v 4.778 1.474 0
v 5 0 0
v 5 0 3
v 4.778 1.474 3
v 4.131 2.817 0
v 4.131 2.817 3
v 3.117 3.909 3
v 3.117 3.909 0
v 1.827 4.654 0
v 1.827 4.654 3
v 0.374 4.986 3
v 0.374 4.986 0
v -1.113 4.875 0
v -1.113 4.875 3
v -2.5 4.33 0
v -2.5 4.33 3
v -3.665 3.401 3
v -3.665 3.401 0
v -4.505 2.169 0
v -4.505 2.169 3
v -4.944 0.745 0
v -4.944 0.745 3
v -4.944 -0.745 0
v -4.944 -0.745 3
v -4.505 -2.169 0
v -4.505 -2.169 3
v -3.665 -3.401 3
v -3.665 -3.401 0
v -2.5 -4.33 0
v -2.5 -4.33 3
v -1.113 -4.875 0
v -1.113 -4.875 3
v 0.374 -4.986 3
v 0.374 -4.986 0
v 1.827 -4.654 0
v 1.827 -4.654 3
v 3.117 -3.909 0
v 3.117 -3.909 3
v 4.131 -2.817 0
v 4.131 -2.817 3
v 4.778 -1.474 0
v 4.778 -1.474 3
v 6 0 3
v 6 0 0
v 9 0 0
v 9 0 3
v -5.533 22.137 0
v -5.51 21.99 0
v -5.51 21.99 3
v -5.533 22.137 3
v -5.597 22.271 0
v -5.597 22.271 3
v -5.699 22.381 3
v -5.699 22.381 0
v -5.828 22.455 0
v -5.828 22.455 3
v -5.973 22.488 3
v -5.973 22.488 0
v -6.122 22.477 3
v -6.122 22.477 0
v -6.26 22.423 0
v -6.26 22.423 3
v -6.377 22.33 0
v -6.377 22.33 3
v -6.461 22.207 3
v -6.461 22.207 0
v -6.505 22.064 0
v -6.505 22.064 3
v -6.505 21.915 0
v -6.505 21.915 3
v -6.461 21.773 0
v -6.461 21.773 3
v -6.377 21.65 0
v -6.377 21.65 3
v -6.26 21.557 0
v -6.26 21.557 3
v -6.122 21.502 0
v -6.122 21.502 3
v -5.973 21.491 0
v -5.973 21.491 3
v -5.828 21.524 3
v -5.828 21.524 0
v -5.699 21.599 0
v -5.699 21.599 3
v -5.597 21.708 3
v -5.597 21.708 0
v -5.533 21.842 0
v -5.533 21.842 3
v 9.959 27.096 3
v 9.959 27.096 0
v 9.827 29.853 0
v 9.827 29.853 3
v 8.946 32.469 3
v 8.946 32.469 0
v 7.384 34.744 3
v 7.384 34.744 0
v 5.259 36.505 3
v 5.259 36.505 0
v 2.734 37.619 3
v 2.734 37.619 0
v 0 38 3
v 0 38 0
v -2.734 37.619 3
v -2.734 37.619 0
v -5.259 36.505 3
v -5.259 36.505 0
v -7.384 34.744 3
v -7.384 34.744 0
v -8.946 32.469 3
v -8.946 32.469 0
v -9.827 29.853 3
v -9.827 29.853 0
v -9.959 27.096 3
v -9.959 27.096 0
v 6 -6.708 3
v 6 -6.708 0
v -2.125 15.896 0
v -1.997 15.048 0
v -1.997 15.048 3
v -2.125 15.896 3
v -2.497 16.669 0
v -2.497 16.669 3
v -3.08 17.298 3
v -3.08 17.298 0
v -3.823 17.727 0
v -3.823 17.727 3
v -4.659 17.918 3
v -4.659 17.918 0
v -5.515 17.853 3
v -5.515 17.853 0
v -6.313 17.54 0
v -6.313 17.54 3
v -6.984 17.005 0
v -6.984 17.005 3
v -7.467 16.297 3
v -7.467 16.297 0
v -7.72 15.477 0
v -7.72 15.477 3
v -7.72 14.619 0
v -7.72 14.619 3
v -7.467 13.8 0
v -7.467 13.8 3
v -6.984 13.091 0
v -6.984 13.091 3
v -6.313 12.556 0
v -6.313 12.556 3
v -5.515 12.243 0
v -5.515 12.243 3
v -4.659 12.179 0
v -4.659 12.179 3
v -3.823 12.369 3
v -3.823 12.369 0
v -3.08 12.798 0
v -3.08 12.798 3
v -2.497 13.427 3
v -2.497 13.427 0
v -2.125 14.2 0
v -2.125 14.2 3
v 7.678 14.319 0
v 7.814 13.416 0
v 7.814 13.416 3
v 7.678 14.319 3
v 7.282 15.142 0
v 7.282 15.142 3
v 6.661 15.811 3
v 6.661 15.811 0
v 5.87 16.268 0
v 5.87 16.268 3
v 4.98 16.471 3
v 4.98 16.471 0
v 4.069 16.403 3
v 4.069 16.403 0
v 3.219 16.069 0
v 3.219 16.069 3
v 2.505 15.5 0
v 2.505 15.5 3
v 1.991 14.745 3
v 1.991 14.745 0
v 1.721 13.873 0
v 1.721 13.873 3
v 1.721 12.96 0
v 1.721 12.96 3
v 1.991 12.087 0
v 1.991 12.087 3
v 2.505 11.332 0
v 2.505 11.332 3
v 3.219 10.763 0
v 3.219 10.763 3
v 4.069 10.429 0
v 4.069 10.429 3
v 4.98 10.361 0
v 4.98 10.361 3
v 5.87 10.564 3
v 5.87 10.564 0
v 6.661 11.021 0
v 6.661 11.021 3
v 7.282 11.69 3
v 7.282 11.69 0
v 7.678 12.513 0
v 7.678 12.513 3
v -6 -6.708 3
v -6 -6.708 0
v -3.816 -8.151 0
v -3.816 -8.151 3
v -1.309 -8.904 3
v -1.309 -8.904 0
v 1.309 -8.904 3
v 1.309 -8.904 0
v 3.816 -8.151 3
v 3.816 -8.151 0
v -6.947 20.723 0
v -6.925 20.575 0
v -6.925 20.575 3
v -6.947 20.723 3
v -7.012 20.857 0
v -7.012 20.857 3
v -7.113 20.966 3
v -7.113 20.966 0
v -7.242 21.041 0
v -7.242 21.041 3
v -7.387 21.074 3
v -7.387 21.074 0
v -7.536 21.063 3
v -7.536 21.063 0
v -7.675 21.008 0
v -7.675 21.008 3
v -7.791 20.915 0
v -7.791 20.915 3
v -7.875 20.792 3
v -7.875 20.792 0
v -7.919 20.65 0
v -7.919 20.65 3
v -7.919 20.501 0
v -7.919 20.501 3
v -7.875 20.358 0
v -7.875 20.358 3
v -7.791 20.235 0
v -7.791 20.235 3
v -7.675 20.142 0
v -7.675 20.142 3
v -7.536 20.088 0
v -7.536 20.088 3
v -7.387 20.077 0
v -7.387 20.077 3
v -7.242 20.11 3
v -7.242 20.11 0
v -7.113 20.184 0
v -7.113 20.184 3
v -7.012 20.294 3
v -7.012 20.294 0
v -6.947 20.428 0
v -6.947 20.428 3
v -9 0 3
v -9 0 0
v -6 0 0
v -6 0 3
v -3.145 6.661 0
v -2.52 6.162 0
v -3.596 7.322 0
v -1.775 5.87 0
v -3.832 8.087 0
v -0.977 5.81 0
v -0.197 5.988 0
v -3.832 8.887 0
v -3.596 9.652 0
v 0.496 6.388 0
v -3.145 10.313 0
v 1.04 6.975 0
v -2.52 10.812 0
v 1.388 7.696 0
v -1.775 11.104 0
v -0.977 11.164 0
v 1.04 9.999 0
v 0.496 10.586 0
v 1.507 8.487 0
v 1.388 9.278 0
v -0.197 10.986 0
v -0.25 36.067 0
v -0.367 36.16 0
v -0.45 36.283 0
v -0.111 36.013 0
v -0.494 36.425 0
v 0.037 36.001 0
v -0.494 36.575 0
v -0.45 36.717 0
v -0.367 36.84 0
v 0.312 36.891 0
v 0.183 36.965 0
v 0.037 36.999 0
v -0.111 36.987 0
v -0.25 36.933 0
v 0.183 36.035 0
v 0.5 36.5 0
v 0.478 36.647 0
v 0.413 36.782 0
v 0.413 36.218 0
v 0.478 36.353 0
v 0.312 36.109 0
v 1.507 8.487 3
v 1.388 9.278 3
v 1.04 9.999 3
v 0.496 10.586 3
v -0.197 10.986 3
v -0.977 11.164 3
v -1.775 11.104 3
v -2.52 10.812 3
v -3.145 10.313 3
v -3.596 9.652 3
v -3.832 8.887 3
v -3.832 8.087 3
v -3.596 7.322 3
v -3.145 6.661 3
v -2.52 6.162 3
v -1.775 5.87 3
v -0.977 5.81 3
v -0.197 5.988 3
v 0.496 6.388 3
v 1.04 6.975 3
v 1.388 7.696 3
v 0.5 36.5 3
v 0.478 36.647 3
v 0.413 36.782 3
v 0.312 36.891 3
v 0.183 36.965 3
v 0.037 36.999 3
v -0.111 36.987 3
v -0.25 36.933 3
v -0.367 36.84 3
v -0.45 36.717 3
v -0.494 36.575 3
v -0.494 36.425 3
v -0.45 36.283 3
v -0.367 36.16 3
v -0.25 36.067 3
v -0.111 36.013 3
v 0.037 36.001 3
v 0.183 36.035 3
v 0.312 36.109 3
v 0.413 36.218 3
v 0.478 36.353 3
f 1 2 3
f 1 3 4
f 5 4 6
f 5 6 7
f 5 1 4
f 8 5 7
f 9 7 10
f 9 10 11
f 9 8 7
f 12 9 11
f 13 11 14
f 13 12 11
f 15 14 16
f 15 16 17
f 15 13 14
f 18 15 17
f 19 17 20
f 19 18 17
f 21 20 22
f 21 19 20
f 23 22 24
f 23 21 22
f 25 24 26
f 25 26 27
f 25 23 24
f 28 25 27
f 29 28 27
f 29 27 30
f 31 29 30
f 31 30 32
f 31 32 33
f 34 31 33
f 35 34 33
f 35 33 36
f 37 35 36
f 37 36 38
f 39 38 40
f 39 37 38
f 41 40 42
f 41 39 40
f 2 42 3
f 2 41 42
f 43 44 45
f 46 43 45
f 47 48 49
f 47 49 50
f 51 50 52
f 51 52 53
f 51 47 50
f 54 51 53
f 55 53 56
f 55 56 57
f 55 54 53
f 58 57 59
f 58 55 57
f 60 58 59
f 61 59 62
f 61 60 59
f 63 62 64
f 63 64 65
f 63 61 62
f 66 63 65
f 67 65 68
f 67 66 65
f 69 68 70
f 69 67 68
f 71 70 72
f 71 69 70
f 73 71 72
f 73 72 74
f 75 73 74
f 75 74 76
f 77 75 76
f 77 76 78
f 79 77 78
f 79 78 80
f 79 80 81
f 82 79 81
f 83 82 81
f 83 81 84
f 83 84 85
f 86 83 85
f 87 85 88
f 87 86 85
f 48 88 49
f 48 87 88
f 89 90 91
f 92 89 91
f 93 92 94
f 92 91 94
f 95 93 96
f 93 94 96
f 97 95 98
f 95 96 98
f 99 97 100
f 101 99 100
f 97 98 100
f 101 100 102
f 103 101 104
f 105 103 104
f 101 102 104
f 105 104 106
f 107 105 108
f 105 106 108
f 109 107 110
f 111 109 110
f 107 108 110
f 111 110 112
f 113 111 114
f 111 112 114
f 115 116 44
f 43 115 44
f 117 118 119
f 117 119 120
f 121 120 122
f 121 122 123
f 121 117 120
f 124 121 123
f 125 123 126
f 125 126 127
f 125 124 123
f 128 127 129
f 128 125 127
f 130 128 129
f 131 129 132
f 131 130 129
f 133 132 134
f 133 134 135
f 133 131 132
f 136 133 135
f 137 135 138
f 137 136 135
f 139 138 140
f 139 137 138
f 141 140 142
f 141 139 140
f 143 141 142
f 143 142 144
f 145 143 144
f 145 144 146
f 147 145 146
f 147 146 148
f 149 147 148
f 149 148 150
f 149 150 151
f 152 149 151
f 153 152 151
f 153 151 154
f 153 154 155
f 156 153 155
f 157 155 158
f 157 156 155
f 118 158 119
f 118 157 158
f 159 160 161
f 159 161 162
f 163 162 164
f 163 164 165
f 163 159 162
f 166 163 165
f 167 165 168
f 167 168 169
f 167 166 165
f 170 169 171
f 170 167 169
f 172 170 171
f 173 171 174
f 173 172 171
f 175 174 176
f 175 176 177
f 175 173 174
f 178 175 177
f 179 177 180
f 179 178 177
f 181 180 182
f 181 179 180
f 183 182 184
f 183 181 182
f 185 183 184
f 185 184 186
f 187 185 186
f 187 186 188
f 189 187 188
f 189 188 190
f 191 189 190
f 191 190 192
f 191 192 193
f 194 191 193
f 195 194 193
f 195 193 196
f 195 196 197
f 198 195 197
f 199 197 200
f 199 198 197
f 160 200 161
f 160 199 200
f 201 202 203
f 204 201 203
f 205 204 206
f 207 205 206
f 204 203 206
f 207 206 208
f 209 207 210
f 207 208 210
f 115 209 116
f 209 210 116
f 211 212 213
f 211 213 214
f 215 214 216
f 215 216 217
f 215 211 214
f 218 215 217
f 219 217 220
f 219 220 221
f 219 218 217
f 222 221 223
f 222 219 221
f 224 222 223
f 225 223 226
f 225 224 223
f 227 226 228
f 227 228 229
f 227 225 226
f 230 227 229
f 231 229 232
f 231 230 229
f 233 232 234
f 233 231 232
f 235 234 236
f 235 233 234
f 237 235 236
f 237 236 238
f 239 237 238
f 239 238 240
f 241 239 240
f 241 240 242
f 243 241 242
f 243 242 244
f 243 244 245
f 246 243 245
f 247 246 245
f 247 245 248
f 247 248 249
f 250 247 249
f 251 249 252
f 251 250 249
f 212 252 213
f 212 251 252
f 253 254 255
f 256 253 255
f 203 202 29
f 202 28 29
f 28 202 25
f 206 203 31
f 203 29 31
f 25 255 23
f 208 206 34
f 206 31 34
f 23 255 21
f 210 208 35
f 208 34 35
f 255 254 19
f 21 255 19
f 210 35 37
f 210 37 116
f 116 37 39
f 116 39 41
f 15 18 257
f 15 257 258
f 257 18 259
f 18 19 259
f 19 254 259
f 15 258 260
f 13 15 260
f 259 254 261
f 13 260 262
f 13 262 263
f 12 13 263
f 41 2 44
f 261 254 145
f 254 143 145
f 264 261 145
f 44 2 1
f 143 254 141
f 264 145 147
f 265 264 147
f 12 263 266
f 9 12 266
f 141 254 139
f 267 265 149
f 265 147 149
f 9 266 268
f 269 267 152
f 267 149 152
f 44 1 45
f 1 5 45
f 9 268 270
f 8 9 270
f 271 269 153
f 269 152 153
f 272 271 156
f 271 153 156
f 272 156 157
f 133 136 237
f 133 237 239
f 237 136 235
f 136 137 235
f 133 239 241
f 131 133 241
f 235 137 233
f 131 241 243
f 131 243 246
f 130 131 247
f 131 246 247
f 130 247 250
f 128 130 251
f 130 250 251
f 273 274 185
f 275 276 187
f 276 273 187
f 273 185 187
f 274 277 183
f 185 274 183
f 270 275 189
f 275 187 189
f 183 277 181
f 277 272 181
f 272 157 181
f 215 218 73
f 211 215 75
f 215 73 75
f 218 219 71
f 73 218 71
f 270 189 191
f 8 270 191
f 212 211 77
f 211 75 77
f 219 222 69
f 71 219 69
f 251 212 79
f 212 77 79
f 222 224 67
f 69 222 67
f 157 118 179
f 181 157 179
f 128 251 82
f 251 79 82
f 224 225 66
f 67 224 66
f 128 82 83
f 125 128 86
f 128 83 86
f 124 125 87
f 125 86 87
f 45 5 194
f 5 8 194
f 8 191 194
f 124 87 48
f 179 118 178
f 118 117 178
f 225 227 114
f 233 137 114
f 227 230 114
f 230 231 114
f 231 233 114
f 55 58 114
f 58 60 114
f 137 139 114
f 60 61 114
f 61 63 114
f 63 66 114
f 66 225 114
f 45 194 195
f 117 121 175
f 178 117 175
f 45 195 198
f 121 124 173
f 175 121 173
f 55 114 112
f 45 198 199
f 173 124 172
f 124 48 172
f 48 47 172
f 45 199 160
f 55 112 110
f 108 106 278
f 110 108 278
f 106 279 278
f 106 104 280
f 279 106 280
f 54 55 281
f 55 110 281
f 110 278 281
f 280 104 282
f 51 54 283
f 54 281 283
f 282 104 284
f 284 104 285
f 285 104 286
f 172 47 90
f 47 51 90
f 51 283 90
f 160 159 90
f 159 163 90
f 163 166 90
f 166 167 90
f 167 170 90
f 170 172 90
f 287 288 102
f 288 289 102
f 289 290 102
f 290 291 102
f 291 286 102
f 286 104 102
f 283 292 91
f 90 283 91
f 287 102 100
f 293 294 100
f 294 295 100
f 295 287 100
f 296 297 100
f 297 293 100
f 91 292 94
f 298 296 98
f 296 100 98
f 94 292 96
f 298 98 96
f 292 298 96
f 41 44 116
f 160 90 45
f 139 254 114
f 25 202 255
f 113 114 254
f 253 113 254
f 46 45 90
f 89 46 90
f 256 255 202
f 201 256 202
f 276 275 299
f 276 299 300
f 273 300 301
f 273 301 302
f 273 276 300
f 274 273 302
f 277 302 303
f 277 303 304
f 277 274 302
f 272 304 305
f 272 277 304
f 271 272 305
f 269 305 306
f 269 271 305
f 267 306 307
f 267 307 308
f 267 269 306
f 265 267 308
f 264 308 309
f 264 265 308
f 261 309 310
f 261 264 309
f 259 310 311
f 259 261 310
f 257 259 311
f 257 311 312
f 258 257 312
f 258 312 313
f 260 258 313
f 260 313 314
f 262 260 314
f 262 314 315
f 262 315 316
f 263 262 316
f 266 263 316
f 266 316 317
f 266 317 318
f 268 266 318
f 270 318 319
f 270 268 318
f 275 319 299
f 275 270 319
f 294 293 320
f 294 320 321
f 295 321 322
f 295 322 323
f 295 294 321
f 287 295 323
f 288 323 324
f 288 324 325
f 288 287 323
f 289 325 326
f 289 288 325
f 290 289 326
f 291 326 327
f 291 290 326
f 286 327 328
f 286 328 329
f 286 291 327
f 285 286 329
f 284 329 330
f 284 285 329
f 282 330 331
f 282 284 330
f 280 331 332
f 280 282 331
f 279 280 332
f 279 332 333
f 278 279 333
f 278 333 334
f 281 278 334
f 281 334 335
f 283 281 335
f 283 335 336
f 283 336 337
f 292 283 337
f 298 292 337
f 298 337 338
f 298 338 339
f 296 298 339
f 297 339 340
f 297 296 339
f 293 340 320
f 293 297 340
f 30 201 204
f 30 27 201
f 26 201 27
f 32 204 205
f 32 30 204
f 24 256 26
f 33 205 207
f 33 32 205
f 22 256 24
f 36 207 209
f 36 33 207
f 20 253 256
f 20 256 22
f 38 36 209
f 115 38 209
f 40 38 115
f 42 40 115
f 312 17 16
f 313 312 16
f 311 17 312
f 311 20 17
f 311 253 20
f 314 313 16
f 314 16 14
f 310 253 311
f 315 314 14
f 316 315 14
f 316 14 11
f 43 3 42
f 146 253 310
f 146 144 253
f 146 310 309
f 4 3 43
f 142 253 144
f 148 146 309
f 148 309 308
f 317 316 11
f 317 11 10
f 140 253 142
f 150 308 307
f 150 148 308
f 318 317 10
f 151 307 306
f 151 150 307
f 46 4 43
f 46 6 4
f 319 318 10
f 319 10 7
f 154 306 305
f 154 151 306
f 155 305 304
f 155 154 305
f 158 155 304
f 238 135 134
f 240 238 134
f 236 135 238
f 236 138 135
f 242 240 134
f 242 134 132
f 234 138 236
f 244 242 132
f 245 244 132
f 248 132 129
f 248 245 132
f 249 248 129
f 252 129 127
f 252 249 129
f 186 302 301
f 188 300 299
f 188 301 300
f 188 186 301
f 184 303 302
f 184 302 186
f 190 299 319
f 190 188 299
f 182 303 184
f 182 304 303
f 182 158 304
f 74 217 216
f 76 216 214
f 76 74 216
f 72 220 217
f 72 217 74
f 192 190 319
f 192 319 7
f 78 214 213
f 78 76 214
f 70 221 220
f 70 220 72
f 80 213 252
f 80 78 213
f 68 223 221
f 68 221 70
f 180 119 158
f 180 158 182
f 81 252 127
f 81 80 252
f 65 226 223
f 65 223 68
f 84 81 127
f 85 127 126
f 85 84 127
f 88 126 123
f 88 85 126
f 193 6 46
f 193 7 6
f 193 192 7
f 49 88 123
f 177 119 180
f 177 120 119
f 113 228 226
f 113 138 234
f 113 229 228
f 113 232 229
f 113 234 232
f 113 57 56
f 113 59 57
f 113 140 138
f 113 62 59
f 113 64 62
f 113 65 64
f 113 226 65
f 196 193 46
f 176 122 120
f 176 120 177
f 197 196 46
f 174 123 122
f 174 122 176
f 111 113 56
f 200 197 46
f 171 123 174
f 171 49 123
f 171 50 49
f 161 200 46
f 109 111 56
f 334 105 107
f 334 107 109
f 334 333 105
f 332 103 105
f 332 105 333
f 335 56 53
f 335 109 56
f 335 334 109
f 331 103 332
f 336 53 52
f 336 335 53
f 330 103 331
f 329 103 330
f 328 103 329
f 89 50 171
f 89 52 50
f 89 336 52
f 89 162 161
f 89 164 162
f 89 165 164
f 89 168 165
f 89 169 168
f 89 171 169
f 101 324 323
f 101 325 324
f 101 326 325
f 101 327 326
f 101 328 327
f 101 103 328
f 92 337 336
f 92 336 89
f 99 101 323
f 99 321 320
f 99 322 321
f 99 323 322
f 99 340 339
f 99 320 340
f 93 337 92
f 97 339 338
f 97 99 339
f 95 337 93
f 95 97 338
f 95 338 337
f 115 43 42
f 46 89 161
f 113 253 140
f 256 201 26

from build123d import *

# Parameters (mm, degrees)
ESQUISSE1_R        = 5
ESQUISSE1_R_2      = 2.877506478
ESQUISSE1_R_3      = 3.063484505
ESQUISSE1_R_4      = 2.684325632
ESQUISSE1_R_5      = 0.5
BOSS_EXTRU_1_DEPTH = 3


with BuildPart() as part:
    # Esquisse1 → Boss.-Extru.1 (new body)
    with BuildSketch(Plane.XY):
        with BuildLine():
            Line((6, -6.708203932), (6, 0))
            Line((6, 0), (9, 0))
            Line((9, 0), (9.959071707, 27.096179922))
            ThreePointArc((9.959071707, 27.096179922), (0, 38), (-9.959071707, 27.096179922))
            Line((-9.959071707, 27.096179922), (-9, 0))
            Line((-9, 0), (-6, 0))
            Line((-6, 0), (-6, -6.708203932))
            ThreePointArc((-6, -6.708203932), (0, -9), (6, -6.708203932))
        make_face()
        Circle(ESQUISSE1_R, mode=Mode.SUBTRACT)
        with Locations((-4.874230419, 15.048067775)):
            Circle(ESQUISSE1_R_2, mode=Mode.SUBTRACT)
        with Locations((4.750736526, 13.416152965)):
            Circle(ESQUISSE1_R_3, mode=Mode.SUBTRACT)
        with Locations((-1.177443807, 8.487104148)):
            Circle(ESQUISSE1_R_4, mode=Mode.SUBTRACT)
        with Locations((-7.424621202, 20.575378798)):
            Circle(ESQUISSE1_R_5, mode=Mode.SUBTRACT)
        with Locations((-6.01040764, 21.98959236)):
            Circle(ESQUISSE1_R_5, mode=Mode.SUBTRACT)
        with Locations((0, 36.5)):
            Circle(ESQUISSE1_R_5, mode=Mode.SUBTRACT)
    extrude(amount=BOSS_EXTRU_1_DEPTH)


solid = part.part
